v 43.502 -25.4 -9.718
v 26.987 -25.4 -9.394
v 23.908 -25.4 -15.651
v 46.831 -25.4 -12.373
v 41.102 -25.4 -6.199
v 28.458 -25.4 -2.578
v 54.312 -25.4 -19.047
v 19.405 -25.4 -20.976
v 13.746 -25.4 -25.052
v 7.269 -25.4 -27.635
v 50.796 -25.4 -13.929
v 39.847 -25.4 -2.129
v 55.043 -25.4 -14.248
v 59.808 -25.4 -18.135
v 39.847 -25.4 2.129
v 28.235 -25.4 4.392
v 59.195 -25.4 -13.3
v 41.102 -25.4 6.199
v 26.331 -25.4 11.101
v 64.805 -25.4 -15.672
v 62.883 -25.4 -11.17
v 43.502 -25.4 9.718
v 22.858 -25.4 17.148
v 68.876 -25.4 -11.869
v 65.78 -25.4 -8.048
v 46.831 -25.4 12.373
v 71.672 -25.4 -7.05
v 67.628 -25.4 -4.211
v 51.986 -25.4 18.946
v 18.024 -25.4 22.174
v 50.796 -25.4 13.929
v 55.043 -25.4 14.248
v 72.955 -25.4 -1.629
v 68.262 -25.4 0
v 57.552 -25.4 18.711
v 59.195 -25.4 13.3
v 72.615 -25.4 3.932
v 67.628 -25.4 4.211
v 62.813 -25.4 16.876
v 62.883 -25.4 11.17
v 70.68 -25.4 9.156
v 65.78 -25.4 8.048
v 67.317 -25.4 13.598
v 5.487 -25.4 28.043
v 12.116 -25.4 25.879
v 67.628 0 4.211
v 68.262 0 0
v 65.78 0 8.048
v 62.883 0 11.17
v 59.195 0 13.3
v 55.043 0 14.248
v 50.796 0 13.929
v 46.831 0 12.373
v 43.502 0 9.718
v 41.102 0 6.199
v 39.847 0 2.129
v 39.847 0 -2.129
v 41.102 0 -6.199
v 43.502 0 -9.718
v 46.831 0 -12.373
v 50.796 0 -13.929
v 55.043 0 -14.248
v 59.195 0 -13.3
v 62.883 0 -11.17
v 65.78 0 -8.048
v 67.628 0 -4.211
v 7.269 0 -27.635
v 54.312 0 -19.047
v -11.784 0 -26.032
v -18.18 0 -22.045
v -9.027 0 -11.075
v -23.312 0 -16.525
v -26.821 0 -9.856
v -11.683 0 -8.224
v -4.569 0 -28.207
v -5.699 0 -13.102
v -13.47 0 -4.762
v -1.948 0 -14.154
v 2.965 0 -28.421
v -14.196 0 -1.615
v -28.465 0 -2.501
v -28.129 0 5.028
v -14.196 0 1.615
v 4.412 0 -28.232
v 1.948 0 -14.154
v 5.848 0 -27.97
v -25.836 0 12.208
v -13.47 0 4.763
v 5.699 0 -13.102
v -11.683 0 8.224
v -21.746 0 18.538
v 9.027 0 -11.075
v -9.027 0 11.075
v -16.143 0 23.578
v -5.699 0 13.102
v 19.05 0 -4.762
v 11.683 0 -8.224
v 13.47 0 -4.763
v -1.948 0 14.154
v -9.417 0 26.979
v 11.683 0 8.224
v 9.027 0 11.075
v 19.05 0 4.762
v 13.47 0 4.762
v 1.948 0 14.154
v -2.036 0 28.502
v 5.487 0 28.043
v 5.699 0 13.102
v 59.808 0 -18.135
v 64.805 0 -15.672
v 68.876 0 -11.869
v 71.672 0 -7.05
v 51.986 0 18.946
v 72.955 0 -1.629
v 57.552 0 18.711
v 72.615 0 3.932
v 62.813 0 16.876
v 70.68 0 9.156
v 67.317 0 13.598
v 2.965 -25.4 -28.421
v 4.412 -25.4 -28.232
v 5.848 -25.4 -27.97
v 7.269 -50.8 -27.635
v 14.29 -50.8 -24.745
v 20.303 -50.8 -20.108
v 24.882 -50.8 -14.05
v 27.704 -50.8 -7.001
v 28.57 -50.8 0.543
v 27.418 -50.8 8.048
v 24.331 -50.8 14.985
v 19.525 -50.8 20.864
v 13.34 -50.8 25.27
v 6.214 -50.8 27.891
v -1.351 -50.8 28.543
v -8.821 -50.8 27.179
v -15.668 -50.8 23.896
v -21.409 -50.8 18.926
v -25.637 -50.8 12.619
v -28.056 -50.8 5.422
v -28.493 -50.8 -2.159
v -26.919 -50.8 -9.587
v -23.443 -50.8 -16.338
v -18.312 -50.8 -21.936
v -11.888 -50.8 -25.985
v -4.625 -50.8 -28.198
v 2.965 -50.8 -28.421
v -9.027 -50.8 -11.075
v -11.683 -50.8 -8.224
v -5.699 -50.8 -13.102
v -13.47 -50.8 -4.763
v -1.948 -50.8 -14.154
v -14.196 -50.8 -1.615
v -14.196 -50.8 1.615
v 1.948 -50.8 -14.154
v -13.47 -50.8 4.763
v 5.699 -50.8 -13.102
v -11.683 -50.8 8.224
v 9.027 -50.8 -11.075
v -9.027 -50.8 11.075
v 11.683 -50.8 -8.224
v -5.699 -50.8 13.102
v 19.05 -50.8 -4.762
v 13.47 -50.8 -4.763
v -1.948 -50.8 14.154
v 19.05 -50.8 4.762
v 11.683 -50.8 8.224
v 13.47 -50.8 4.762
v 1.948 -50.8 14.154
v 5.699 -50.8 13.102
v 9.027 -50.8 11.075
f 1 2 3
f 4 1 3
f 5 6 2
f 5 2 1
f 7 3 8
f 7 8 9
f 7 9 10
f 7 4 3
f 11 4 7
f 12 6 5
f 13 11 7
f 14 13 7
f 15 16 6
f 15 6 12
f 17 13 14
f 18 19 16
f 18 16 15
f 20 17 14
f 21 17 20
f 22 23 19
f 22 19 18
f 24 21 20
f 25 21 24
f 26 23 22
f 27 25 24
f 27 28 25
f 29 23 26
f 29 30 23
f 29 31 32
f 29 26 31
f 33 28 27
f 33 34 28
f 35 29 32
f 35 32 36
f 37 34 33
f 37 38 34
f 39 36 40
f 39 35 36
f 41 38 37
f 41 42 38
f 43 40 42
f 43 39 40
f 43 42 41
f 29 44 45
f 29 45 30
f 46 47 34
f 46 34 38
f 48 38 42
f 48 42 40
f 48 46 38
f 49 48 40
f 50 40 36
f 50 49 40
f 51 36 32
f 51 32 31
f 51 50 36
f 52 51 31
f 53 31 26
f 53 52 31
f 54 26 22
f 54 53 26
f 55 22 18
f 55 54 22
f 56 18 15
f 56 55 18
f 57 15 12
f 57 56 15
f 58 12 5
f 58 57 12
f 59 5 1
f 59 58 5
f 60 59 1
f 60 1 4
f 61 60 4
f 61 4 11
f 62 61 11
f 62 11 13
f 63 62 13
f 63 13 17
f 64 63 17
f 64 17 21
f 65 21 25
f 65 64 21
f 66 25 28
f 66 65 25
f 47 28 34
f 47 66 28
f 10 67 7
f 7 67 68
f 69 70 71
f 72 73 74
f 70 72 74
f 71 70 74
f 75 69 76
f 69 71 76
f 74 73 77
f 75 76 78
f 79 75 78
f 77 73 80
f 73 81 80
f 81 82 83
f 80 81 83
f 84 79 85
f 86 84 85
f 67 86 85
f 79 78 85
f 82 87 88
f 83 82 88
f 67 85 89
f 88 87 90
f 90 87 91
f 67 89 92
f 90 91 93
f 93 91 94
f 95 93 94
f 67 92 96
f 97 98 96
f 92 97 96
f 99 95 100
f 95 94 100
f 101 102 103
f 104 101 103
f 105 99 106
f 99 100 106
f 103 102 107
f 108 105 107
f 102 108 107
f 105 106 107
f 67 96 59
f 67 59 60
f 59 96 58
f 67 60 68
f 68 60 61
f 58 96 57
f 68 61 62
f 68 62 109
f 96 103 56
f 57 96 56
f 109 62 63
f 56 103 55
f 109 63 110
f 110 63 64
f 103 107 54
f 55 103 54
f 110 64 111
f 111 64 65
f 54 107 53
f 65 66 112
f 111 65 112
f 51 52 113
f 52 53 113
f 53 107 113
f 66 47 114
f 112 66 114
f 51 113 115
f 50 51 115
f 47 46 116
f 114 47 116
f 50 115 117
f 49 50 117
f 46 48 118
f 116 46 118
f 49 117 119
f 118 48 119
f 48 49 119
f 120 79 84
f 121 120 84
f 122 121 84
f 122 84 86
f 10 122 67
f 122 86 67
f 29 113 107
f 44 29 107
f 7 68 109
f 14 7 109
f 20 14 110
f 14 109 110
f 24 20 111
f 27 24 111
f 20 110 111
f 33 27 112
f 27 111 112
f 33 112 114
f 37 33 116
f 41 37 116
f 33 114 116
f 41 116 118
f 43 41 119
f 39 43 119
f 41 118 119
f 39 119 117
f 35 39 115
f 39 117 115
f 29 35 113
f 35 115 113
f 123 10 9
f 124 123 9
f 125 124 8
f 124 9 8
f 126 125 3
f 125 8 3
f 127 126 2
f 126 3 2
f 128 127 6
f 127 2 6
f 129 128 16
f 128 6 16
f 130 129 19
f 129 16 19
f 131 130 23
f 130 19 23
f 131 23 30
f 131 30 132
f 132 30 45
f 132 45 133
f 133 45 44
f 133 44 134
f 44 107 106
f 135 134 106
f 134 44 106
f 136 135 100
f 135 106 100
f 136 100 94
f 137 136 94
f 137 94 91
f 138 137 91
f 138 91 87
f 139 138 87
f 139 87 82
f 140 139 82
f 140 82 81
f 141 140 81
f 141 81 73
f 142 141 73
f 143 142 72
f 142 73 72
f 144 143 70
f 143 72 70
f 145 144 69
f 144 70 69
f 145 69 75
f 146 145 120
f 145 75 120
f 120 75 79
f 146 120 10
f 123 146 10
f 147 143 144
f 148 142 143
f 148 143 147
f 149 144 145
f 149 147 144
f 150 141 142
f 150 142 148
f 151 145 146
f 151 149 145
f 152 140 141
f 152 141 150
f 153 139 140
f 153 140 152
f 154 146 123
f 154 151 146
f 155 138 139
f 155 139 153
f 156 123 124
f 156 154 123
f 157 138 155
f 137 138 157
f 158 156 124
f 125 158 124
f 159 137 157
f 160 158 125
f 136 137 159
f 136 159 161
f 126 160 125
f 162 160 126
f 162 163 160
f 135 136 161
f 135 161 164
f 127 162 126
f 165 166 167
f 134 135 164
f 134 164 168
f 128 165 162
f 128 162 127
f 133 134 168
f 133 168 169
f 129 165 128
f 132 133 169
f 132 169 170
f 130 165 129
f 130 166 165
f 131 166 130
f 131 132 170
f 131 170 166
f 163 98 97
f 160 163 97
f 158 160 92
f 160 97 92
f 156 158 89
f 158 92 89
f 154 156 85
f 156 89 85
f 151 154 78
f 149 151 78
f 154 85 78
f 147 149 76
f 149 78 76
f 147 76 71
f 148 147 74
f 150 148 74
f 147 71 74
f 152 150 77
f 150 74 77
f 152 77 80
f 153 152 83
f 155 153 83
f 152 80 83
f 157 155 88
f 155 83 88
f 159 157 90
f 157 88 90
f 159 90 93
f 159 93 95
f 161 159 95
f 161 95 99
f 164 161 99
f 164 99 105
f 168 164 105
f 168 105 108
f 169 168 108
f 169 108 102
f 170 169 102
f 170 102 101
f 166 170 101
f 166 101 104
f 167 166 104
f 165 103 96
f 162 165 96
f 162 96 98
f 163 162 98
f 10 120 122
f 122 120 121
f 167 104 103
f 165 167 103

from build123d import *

# Parameters (mm, degrees)
F0_R     = 14.2875
F1_DEPTH = 25.4
F2_DEPTH = 50.8


with BuildPart() as f1:
    # F0 (on Front) → F1 (new body)
    with BuildSketch(Plane.XZ):
        with BuildLine():
            ThreePointArc((7.2685239989, -27.6351078138), (22.6299436397, -17.4475292195), (28.575, 0))
            ThreePointArc((28.575, 0), (22.0602527934, 18.162485284), (5.4865750347, 28.0433257548))
            ThreePointArc((5.4865750347, 28.0433257548), (-28.5465468103, 1.2748687029), (2.9649285011, -28.4207639585))
            Line((2.9649285011, -28.4207639585), (7.2685239989, -27.6351078138))
        make_face()
        with BuildLine():
            ThreePointArc((-13.4703841816, 4.7625), (0, 14.2875), (13.4703841816, 4.7625))
            Line((13.4703841816, 4.7625), (19.05, 4.7625))
            Line((19.05, 4.7625), (19.05, -4.7625))
            Line((19.05, -4.7625), (13.4703841816, -4.7625))
            ThreePointArc((13.4703841816, -4.7625), (0, -14.2875), (-13.4703841816, -4.7625))
            Line((-13.4703841816, -4.7625), (-19.05, -4.7625))
            Line((-19.05, -4.7625), (-19.05, 4.7625))
            Line((-19.05, 4.7625), (-13.4703841816, 4.7625))
        make_face(mode=Mode.SUBTRACT)
        with BuildLine():
            ThreePointArc((5.4865750347, 28.0433257548), (22.0602527934, 18.162485284), (28.575, 0))
            ThreePointArc((28.575, 0), (22.6299436397, -17.4475292195), (7.2685239989, -27.6351078138))
            Line((7.2685239989, -27.6351078138), (54.3115272683, -19.0470273113))
            ThreePointArc((54.3115272683, -19.0470273113), (34.9605862818, -1.1638603674), (51.9860051328, 18.9458808034))
            Line((51.9860051328, 18.9458808034), (5.4865750347, 28.0433257548))
        make_face()
        with BuildLine():
            ThreePointArc((2.9649285011, -28.4207639585), (5.1317834533, -28.1104148598), (7.2685239989, -27.6351078138))
            Line((7.2685239989, -27.6351078138), (2.9649285011, -28.4207639585))
        make_face()
        with BuildLine():
            ThreePointArc((73.025, 0), (66.7227870193, 14.1561444649), (51.9860051328, 18.9458808034))
            ThreePointArc((51.9860051328, 18.9458808034), (34.9605862818, -1.1638603674), (54.3115272683, -19.0470273113))
            ThreePointArc((54.3115272683, -19.0470273113), (67.5638436679, -13.3508736706), (73.025, 0))
        make_face()
        with Locations((53.975, 0)):
            Circle(F0_R, mode=Mode.SUBTRACT)
    extrude(amount=F1_DEPTH)

    # F0 (on Front) → F2 (join)
    with BuildSketch(Plane.XZ):
        with BuildLine():
            ThreePointArc((7.2685239989, -27.6351078138), (22.6299436397, -17.4475292195), (28.575, 0))
            ThreePointArc((28.575, 0), (22.0602527934, 18.162485284), (5.4865750347, 28.0433257548))
            ThreePointArc((5.4865750347, 28.0433257548), (-28.5465468103, 1.2748687029), (2.9649285011, -28.4207639585))
            Line((2.9649285011, -28.4207639585), (7.2685239989, -27.6351078138))
        make_face()
        with BuildLine():
            ThreePointArc((-13.4703841816, 4.7625), (0, 14.2875), (13.4703841816, 4.7625))
            Line((13.4703841816, 4.7625), (19.05, 4.7625))
            Line((19.05, 4.7625), (19.05, -4.7625))
            Line((19.05, -4.7625), (13.4703841816, -4.7625))
            ThreePointArc((13.4703841816, -4.7625), (0, -14.2875), (-13.4703841816, -4.7625))
            Line((-13.4703841816, -4.7625), (-19.05, -4.7625))
            Line((-19.05, -4.7625), (-19.05, 4.7625))
            Line((-19.05, 4.7625), (-13.4703841816, 4.7625))
        make_face(mode=Mode.SUBTRACT)
        with BuildLine():
            ThreePointArc((-13.4703841816, -4.7625), (-14.2875, 0), (-13.4703841816, 4.7625))
            Line((-13.4703841816, 4.7625), (-19.05, 4.7625))
            Line((-19.05, 4.7625), (-19.05, -4.7625))
            Line((-19.05, -4.7625), (-13.4703841816, -4.7625))
        make_face()
    extrude(amount=F2_DEPTH)


solid = f1.part
